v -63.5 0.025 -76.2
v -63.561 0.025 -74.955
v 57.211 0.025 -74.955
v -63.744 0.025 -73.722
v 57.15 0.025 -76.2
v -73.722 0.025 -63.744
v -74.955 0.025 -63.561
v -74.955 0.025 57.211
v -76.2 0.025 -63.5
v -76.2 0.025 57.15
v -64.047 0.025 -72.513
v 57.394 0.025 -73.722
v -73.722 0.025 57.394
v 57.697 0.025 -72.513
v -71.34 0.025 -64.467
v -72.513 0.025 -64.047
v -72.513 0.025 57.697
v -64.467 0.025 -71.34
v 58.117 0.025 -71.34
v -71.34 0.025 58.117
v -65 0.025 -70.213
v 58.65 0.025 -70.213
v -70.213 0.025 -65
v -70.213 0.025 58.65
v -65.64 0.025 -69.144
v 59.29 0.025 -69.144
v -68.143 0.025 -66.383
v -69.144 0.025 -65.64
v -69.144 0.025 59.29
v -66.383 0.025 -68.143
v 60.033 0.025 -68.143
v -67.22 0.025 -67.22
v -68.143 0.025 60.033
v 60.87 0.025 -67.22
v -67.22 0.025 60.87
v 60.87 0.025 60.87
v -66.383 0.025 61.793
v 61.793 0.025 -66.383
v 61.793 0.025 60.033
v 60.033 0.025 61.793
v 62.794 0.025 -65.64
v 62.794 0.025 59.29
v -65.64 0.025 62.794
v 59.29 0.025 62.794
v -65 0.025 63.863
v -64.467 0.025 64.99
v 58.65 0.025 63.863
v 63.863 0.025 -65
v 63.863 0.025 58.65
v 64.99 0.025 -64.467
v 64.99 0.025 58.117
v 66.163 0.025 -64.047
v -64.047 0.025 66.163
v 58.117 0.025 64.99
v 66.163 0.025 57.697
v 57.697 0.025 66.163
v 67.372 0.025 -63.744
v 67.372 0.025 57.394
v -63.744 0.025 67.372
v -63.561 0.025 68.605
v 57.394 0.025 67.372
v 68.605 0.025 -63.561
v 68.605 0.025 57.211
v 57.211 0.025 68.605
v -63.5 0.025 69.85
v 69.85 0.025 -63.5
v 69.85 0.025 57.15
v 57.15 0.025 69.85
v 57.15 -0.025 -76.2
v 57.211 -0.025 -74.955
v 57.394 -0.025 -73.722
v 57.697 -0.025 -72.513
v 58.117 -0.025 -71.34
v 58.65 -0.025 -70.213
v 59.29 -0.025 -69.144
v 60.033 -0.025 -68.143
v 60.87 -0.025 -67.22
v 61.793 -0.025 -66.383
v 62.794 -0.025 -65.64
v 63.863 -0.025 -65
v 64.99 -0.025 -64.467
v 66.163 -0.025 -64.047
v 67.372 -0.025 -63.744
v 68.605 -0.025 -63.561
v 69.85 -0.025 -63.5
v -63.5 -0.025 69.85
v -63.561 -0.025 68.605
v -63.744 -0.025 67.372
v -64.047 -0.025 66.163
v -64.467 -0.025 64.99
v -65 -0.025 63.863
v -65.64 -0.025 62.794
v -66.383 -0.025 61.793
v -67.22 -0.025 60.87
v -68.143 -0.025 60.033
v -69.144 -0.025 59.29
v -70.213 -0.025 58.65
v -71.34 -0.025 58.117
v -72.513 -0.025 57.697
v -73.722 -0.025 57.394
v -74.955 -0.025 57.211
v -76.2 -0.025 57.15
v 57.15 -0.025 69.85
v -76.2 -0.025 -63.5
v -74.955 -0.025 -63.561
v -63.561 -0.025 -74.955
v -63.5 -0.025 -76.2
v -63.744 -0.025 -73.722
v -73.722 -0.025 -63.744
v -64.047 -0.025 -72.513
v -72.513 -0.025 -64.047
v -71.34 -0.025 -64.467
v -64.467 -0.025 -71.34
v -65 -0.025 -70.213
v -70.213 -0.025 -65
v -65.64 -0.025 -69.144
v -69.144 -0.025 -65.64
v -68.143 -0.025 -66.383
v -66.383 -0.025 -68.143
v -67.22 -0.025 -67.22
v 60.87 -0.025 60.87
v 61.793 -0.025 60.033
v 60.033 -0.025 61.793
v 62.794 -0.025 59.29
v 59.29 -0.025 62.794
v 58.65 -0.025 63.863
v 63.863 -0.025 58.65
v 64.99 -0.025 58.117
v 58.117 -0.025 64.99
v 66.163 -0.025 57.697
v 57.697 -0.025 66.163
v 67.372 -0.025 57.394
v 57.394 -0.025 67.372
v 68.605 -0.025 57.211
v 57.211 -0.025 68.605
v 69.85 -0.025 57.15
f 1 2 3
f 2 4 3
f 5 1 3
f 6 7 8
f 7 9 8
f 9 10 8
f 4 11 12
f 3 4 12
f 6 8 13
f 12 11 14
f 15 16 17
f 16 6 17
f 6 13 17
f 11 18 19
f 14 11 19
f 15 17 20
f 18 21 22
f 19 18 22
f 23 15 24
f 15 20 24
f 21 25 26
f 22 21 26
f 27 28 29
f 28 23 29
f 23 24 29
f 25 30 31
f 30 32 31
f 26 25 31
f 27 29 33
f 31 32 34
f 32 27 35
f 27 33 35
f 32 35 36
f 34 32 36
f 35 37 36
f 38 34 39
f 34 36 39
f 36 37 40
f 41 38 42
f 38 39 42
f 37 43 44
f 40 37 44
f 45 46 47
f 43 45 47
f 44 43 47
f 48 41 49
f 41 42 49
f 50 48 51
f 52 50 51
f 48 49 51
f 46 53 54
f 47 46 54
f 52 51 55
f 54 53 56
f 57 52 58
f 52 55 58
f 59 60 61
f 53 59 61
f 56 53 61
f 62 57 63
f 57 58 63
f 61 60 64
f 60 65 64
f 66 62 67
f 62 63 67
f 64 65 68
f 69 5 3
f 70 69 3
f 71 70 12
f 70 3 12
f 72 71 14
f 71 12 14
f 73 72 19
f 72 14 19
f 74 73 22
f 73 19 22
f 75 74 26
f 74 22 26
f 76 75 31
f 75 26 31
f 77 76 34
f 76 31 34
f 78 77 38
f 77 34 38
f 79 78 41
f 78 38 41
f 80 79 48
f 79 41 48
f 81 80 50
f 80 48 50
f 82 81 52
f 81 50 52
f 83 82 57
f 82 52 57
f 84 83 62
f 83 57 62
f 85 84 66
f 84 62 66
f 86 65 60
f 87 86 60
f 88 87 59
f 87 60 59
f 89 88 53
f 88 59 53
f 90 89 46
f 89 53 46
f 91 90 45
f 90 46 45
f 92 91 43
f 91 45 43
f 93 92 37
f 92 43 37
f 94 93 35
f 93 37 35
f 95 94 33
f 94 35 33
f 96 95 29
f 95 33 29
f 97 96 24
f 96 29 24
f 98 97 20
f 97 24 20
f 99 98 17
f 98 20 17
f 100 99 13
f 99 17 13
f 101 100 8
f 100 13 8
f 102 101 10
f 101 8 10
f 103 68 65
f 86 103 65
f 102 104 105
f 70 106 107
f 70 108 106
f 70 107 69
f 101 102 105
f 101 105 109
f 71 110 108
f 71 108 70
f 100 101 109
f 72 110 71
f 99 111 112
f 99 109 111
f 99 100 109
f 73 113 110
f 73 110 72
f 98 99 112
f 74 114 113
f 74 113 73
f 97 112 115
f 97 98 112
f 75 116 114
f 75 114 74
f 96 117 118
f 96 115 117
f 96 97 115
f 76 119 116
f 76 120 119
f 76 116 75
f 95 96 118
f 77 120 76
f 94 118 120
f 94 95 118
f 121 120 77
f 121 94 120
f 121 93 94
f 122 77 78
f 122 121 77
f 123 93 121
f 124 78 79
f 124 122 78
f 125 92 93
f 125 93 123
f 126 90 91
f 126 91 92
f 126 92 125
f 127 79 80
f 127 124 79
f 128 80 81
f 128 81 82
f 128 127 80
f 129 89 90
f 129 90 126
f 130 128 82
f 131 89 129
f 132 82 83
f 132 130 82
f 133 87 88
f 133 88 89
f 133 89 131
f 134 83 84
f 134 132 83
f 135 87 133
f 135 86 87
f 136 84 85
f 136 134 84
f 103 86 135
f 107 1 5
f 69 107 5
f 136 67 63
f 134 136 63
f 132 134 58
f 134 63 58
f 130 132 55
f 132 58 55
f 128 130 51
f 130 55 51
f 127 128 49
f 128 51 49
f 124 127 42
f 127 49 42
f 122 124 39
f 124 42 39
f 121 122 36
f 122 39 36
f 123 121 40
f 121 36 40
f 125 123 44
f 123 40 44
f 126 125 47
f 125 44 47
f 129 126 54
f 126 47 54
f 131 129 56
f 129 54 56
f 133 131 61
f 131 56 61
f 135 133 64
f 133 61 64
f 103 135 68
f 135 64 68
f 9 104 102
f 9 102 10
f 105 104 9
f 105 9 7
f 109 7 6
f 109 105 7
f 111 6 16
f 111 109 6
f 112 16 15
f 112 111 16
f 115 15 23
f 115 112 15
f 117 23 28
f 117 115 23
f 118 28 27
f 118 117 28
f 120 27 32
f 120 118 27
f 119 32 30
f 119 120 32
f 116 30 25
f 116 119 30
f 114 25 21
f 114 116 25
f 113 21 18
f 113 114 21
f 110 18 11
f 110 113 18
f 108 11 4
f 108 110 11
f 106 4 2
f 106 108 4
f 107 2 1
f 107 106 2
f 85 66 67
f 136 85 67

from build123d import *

# Parameters (mm, degrees)
SKETCH3_W                = 152.4
SKETCH3_H                = 0.0508
BOSS_EXTRUDE1_DEPTH      = 76.2
BOSS_EXTRUDE1_DEPTH_BACK = 76.2
CUT_EXTRUDE4_DEPTH       = 25.4


with BuildPart() as part:
    # Sketch3 → Boss-Extrude1 (new, two sides)
    with BuildSketch(Plane.XY) as boss_extrude1_sk:
        Rectangle(SKETCH3_W, SKETCH3_H)
    extrude(amount=BOSS_EXTRUDE1_DEPTH)
    extrude(boss_extrude1_sk.sketch, amount=-BOSS_EXTRUDE1_DEPTH_BACK)

    # Sketch7 → Cut-Extrude4 (cut, symmetric)
    with BuildSketch(Plane(origin=(0, 0.0254, 0), x_dir=(1, 0, 0), z_dir=(0, 1, 0))):
        with BuildLine():
            Line((-63.5, 76.2), (-76.2, 76.2))
            Line((-76.2, 76.2), (-76.2, 63.5))
            ThreePointArc((-76.2, 63.5), (-67.219743879, 67.219743879), (-63.5, 76.2))
        make_face()
        with BuildLine():
            Line((-76.2, -57.15), (-76.2, -76.2))
            Line((-76.2, -76.2), (76.2, -76.2))
            Line((76.2, -76.2), (76.2, 76.2))
            Line((76.2, 76.2), (57.15, 76.2))
            ThreePointArc((57.15, 76.2), (60.869743879, 67.219743879), (69.85, 63.5))
            Line((69.85, 63.5), (69.85, -57.15))
            ThreePointArc((69.85, -57.15), (60.869743879, -60.869743879), (57.15, -69.85))
            Line((57.15, -69.85), (-63.5, -69.85))
            ThreePointArc((-63.5, -69.85), (-67.219743879, -60.869743879), (-76.2, -57.15))
        make_face()
    extrude(amount=CUT_EXTRUDE4_DEPTH, both=True, mode=Mode.SUBTRACT)


solid = part.part
